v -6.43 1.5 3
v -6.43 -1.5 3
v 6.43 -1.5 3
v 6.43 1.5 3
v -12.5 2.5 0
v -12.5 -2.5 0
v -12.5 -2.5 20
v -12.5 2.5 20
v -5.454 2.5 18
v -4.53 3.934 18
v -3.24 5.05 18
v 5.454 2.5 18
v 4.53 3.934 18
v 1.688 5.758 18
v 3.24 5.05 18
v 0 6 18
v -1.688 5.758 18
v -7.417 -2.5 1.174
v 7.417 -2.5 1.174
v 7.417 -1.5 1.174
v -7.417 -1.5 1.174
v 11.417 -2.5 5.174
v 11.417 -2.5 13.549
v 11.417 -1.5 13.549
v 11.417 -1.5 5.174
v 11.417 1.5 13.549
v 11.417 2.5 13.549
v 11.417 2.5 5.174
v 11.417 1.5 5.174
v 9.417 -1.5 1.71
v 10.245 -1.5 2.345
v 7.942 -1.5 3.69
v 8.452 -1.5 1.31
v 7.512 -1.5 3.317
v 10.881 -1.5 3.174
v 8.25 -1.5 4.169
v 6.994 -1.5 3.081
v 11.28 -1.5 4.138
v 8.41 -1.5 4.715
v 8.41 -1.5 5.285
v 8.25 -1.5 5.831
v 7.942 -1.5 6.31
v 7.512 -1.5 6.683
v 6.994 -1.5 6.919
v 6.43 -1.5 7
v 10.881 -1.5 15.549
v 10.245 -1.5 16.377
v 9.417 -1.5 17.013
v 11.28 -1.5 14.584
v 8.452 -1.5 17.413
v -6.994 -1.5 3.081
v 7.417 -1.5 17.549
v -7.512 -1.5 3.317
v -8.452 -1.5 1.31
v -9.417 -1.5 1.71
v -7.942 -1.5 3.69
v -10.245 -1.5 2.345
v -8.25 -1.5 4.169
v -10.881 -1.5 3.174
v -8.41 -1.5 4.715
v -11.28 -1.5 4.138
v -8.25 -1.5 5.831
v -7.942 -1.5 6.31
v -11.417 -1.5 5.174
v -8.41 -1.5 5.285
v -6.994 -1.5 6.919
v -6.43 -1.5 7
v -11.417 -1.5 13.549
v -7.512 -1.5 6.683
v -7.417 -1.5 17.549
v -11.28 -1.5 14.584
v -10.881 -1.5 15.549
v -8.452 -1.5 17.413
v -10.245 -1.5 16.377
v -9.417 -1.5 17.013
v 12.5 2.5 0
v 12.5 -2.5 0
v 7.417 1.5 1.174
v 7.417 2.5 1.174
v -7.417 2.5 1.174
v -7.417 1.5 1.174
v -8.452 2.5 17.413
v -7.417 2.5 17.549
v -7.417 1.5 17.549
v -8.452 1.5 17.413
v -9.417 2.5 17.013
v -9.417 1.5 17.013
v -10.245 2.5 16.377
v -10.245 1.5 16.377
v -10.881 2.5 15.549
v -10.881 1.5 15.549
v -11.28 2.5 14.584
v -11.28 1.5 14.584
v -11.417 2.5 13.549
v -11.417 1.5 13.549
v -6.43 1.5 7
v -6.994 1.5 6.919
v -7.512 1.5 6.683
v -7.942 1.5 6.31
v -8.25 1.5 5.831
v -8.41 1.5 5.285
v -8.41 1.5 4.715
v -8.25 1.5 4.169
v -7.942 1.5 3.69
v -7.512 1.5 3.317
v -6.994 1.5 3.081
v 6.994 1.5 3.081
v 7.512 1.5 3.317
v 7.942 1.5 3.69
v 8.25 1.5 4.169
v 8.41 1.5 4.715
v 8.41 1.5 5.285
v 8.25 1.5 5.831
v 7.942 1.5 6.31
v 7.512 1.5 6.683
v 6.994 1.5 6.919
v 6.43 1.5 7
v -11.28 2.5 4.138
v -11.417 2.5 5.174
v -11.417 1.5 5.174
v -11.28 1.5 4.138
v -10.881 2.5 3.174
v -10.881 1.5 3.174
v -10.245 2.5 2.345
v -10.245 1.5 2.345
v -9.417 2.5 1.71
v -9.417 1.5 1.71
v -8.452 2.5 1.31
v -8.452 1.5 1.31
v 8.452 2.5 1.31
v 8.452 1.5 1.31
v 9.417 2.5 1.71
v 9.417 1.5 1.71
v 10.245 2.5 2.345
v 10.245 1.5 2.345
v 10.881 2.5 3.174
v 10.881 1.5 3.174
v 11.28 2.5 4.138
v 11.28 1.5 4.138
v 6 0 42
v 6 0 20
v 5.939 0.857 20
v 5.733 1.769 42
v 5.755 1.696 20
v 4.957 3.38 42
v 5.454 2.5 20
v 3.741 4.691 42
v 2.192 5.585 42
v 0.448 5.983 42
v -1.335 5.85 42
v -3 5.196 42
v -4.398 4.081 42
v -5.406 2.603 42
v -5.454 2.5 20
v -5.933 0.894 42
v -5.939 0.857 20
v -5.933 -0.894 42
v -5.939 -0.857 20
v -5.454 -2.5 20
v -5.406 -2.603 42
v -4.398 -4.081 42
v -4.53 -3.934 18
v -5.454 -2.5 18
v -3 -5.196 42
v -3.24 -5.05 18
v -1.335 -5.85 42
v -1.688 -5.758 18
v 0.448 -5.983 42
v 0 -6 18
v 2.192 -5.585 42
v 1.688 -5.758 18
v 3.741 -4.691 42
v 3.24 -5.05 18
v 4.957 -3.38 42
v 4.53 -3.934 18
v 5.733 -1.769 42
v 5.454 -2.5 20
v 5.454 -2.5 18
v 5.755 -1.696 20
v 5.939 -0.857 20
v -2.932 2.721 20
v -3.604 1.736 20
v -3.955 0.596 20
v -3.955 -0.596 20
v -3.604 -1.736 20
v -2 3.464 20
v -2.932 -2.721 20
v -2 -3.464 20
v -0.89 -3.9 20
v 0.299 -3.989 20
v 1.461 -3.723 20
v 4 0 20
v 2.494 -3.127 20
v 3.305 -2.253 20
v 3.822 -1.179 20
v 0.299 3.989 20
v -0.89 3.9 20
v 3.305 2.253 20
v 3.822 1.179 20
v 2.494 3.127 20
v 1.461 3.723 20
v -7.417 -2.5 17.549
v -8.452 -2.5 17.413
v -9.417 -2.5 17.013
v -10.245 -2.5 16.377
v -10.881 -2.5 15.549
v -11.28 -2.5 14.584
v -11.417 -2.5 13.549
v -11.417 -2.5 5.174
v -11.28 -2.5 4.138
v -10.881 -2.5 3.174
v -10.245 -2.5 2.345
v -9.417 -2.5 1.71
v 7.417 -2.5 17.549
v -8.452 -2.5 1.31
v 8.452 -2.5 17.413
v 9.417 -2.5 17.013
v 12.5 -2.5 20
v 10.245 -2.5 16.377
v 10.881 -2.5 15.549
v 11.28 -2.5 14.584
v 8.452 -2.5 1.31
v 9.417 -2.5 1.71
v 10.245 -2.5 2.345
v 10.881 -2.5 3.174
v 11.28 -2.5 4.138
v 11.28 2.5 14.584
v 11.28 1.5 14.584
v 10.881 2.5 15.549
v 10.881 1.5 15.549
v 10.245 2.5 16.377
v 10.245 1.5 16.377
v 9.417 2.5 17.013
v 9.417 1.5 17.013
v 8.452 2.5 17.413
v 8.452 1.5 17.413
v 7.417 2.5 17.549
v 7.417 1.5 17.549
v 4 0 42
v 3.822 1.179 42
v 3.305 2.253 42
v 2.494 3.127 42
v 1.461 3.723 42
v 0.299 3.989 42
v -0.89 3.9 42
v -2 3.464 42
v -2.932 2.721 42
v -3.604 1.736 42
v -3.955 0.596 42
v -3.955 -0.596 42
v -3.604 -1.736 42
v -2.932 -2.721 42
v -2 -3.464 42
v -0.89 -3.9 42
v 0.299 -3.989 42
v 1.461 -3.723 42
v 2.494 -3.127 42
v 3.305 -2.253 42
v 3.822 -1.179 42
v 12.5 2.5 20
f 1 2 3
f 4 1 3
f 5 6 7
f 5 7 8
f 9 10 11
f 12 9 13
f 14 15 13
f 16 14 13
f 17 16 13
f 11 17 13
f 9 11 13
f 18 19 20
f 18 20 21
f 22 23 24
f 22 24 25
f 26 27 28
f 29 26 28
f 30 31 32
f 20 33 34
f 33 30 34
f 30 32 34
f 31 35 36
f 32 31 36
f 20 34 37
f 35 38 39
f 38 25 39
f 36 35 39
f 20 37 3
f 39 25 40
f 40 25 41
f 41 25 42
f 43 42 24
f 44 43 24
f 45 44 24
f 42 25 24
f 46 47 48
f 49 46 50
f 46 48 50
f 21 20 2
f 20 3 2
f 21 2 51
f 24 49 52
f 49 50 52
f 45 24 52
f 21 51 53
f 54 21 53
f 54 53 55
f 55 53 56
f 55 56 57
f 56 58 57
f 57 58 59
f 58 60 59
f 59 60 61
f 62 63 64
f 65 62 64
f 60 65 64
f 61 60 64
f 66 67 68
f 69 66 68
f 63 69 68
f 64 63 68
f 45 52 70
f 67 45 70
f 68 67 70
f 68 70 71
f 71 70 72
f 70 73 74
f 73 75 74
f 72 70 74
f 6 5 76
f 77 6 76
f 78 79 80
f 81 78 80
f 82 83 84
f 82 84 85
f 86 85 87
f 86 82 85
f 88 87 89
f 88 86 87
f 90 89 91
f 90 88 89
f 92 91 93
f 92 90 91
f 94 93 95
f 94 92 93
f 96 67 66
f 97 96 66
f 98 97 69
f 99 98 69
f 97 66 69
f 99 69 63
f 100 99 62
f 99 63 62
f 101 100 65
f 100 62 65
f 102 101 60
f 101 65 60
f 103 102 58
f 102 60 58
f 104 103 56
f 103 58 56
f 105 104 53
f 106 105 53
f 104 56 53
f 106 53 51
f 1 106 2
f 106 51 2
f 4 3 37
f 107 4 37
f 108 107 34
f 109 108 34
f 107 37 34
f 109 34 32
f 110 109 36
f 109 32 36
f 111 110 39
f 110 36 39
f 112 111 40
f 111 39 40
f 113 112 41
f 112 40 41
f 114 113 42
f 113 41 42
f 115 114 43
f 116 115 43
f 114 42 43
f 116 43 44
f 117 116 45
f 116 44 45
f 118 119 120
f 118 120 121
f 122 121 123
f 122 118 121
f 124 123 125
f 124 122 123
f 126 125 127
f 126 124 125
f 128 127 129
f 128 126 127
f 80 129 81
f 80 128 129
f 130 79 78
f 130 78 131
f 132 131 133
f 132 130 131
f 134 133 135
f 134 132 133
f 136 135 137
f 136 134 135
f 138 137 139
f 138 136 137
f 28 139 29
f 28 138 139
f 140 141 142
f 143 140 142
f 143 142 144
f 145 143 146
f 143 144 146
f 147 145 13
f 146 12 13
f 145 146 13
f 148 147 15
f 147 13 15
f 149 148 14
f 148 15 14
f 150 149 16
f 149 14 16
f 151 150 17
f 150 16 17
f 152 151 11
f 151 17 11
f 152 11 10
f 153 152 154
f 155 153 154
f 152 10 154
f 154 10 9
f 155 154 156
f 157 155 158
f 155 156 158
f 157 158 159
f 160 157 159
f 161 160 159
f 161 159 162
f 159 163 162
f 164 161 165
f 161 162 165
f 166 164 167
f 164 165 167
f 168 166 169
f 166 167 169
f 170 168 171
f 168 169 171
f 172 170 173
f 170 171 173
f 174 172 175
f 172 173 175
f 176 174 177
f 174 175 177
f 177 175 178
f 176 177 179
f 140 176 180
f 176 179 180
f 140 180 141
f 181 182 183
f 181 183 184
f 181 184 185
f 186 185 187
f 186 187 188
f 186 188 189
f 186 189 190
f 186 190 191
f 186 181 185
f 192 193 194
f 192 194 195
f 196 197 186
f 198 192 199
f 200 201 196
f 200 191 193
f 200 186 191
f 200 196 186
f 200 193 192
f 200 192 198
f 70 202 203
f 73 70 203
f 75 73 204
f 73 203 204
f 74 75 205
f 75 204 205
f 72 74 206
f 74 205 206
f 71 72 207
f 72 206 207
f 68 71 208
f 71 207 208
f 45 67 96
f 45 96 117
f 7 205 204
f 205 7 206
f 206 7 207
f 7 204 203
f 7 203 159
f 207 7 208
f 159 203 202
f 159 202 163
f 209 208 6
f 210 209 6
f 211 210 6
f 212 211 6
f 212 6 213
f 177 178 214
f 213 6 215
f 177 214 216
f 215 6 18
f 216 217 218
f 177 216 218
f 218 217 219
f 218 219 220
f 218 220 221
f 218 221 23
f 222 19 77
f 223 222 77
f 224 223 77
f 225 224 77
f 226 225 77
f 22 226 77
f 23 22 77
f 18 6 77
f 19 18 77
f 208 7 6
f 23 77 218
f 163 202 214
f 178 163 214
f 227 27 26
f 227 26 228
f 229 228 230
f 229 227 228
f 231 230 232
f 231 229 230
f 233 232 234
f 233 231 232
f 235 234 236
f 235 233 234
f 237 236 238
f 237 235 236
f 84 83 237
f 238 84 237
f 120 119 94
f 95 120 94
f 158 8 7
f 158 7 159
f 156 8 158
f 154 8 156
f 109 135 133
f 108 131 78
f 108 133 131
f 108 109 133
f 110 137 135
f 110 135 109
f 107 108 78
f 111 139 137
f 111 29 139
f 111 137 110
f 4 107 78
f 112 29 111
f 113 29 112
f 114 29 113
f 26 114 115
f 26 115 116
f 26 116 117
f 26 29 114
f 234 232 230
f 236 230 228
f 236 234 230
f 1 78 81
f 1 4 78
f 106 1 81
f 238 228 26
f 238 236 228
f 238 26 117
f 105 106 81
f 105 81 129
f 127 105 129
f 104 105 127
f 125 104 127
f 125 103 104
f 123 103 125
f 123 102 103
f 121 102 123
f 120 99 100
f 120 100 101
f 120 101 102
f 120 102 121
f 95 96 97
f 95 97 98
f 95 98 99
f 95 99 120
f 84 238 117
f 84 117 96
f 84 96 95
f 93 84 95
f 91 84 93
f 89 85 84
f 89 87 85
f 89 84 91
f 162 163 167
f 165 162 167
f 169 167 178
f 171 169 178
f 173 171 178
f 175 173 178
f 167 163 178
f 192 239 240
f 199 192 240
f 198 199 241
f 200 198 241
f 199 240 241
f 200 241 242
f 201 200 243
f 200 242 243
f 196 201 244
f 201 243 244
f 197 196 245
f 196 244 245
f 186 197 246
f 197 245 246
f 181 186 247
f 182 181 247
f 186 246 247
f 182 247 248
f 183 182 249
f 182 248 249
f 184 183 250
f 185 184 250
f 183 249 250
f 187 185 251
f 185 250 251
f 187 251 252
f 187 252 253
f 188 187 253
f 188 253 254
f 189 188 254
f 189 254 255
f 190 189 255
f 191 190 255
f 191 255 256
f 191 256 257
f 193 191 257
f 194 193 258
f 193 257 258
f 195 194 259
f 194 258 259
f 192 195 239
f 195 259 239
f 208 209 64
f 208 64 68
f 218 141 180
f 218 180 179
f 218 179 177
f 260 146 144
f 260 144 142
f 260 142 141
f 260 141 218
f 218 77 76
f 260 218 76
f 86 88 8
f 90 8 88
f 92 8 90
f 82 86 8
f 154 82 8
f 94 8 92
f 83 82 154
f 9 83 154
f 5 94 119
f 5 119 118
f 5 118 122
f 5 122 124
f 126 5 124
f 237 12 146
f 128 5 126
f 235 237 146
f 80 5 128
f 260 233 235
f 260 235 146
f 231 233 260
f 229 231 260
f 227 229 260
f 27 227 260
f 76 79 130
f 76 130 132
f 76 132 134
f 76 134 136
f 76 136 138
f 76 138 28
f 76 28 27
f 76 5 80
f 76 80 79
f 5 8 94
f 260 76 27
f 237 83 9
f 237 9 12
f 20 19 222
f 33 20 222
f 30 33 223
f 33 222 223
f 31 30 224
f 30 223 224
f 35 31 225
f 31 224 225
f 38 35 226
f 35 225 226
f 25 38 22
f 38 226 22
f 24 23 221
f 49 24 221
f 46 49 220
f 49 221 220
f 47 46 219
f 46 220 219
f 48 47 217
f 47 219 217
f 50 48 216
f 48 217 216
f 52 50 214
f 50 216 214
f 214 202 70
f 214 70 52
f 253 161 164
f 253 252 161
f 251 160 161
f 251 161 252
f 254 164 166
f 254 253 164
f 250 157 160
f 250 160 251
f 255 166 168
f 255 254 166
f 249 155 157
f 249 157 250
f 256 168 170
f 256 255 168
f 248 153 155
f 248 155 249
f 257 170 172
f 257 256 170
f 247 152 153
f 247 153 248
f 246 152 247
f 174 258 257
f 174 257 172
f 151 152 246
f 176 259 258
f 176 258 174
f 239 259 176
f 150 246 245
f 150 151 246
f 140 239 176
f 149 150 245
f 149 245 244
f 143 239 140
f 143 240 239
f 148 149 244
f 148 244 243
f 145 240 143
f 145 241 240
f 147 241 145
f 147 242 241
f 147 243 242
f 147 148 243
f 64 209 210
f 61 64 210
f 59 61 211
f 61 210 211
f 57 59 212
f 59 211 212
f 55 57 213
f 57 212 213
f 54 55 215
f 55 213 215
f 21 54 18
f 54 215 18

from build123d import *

# Parameters (mm, degrees)
SKETCH006_W     = 25
SKETCH006_H     = 5
PAD_DEPTH       = 20
SKETCH_R        = 6
PAD001_DEPTH    = 24
SKETCH001_R     = 4
POCKET001_DEPTH = 22
POCKET002_DEPTH = 5
POCKET003_DEPTH = 1


with BuildPart() as part:
    # Sketch006 → Pad (new body)
    with BuildSketch(Plane.XY):
        Rectangle(SKETCH006_W, SKETCH006_H)
    extrude(amount=PAD_DEPTH)

    # Sketch (on Face6 of Pad) → Pad001 (join)
    with BuildSketch(Plane.XY.offset(18)):
        Circle(SKETCH_R)
    extrude(amount=PAD001_DEPTH)

    # Sketch001 (on Face11 of Pad001) → Pocket001 (cut)
    with BuildSketch(Plane.XY.offset(42)):
        Circle(SKETCH001_R)
    extrude(amount=-POCKET001_DEPTH, mode=Mode.SUBTRACT)

    # Sketch009 (on Face9 of Pocket001) → Pocket002 (cut)
    with BuildSketch(Plane.XZ.offset(2.5)):
        with BuildLine():
            ThreePointArc((-6.430284, 7), (-8.430284, 5), (-6.430284, 3))
            Line((-6.430284, 3), (6.430284, 3))
            ThreePointArc((6.430284, 3), (8.430284, 5), (6.430284, 7))
            Line((-6.430284, 7), (6.430284, 7))
        make_face()
    extrude(amount=-POCKET002_DEPTH, mode=Mode.SUBTRACT)

    # Sketch010 (on Face13 of Pocket002) → Pocket003 (cut)
    with BuildSketch(Plane.XZ.offset(2.5)):
        with BuildLine():
            Line((-7.41661, 17.549025), (7.41661, 17.549025))
            ThreePointArc((11.41661, 13.549025), (10.245037, 16.377452), (7.41661, 17.549025))
            Line((11.41661, 13.549025), (11.41661, 5.173753))
            ThreePointArc((7.41661, 1.173753), (10.245037, 2.345326), (11.41661, 5.173753))
            Line((7.41661, 1.173753), (-7.41661, 1.173753))
            ThreePointArc((-11.41661, 5.173753), (-10.245037, 2.345326), (-7.41661, 1.173753))
            Line((-11.41661, 5.173753), (-11.41661, 13.549025))
            ThreePointArc((-7.41661, 17.549025), (-10.245037, 16.377452), (-11.41661, 13.549025))
        make_face()
    pocket003 = extrude(amount=-POCKET003_DEPTH, mode=Mode.SUBTRACT)

    # Mirrored: Pocket003 across XZ
    add(pocket003.mirror(Plane.XZ), mode=Mode.SUBTRACT)


solid = part.part
